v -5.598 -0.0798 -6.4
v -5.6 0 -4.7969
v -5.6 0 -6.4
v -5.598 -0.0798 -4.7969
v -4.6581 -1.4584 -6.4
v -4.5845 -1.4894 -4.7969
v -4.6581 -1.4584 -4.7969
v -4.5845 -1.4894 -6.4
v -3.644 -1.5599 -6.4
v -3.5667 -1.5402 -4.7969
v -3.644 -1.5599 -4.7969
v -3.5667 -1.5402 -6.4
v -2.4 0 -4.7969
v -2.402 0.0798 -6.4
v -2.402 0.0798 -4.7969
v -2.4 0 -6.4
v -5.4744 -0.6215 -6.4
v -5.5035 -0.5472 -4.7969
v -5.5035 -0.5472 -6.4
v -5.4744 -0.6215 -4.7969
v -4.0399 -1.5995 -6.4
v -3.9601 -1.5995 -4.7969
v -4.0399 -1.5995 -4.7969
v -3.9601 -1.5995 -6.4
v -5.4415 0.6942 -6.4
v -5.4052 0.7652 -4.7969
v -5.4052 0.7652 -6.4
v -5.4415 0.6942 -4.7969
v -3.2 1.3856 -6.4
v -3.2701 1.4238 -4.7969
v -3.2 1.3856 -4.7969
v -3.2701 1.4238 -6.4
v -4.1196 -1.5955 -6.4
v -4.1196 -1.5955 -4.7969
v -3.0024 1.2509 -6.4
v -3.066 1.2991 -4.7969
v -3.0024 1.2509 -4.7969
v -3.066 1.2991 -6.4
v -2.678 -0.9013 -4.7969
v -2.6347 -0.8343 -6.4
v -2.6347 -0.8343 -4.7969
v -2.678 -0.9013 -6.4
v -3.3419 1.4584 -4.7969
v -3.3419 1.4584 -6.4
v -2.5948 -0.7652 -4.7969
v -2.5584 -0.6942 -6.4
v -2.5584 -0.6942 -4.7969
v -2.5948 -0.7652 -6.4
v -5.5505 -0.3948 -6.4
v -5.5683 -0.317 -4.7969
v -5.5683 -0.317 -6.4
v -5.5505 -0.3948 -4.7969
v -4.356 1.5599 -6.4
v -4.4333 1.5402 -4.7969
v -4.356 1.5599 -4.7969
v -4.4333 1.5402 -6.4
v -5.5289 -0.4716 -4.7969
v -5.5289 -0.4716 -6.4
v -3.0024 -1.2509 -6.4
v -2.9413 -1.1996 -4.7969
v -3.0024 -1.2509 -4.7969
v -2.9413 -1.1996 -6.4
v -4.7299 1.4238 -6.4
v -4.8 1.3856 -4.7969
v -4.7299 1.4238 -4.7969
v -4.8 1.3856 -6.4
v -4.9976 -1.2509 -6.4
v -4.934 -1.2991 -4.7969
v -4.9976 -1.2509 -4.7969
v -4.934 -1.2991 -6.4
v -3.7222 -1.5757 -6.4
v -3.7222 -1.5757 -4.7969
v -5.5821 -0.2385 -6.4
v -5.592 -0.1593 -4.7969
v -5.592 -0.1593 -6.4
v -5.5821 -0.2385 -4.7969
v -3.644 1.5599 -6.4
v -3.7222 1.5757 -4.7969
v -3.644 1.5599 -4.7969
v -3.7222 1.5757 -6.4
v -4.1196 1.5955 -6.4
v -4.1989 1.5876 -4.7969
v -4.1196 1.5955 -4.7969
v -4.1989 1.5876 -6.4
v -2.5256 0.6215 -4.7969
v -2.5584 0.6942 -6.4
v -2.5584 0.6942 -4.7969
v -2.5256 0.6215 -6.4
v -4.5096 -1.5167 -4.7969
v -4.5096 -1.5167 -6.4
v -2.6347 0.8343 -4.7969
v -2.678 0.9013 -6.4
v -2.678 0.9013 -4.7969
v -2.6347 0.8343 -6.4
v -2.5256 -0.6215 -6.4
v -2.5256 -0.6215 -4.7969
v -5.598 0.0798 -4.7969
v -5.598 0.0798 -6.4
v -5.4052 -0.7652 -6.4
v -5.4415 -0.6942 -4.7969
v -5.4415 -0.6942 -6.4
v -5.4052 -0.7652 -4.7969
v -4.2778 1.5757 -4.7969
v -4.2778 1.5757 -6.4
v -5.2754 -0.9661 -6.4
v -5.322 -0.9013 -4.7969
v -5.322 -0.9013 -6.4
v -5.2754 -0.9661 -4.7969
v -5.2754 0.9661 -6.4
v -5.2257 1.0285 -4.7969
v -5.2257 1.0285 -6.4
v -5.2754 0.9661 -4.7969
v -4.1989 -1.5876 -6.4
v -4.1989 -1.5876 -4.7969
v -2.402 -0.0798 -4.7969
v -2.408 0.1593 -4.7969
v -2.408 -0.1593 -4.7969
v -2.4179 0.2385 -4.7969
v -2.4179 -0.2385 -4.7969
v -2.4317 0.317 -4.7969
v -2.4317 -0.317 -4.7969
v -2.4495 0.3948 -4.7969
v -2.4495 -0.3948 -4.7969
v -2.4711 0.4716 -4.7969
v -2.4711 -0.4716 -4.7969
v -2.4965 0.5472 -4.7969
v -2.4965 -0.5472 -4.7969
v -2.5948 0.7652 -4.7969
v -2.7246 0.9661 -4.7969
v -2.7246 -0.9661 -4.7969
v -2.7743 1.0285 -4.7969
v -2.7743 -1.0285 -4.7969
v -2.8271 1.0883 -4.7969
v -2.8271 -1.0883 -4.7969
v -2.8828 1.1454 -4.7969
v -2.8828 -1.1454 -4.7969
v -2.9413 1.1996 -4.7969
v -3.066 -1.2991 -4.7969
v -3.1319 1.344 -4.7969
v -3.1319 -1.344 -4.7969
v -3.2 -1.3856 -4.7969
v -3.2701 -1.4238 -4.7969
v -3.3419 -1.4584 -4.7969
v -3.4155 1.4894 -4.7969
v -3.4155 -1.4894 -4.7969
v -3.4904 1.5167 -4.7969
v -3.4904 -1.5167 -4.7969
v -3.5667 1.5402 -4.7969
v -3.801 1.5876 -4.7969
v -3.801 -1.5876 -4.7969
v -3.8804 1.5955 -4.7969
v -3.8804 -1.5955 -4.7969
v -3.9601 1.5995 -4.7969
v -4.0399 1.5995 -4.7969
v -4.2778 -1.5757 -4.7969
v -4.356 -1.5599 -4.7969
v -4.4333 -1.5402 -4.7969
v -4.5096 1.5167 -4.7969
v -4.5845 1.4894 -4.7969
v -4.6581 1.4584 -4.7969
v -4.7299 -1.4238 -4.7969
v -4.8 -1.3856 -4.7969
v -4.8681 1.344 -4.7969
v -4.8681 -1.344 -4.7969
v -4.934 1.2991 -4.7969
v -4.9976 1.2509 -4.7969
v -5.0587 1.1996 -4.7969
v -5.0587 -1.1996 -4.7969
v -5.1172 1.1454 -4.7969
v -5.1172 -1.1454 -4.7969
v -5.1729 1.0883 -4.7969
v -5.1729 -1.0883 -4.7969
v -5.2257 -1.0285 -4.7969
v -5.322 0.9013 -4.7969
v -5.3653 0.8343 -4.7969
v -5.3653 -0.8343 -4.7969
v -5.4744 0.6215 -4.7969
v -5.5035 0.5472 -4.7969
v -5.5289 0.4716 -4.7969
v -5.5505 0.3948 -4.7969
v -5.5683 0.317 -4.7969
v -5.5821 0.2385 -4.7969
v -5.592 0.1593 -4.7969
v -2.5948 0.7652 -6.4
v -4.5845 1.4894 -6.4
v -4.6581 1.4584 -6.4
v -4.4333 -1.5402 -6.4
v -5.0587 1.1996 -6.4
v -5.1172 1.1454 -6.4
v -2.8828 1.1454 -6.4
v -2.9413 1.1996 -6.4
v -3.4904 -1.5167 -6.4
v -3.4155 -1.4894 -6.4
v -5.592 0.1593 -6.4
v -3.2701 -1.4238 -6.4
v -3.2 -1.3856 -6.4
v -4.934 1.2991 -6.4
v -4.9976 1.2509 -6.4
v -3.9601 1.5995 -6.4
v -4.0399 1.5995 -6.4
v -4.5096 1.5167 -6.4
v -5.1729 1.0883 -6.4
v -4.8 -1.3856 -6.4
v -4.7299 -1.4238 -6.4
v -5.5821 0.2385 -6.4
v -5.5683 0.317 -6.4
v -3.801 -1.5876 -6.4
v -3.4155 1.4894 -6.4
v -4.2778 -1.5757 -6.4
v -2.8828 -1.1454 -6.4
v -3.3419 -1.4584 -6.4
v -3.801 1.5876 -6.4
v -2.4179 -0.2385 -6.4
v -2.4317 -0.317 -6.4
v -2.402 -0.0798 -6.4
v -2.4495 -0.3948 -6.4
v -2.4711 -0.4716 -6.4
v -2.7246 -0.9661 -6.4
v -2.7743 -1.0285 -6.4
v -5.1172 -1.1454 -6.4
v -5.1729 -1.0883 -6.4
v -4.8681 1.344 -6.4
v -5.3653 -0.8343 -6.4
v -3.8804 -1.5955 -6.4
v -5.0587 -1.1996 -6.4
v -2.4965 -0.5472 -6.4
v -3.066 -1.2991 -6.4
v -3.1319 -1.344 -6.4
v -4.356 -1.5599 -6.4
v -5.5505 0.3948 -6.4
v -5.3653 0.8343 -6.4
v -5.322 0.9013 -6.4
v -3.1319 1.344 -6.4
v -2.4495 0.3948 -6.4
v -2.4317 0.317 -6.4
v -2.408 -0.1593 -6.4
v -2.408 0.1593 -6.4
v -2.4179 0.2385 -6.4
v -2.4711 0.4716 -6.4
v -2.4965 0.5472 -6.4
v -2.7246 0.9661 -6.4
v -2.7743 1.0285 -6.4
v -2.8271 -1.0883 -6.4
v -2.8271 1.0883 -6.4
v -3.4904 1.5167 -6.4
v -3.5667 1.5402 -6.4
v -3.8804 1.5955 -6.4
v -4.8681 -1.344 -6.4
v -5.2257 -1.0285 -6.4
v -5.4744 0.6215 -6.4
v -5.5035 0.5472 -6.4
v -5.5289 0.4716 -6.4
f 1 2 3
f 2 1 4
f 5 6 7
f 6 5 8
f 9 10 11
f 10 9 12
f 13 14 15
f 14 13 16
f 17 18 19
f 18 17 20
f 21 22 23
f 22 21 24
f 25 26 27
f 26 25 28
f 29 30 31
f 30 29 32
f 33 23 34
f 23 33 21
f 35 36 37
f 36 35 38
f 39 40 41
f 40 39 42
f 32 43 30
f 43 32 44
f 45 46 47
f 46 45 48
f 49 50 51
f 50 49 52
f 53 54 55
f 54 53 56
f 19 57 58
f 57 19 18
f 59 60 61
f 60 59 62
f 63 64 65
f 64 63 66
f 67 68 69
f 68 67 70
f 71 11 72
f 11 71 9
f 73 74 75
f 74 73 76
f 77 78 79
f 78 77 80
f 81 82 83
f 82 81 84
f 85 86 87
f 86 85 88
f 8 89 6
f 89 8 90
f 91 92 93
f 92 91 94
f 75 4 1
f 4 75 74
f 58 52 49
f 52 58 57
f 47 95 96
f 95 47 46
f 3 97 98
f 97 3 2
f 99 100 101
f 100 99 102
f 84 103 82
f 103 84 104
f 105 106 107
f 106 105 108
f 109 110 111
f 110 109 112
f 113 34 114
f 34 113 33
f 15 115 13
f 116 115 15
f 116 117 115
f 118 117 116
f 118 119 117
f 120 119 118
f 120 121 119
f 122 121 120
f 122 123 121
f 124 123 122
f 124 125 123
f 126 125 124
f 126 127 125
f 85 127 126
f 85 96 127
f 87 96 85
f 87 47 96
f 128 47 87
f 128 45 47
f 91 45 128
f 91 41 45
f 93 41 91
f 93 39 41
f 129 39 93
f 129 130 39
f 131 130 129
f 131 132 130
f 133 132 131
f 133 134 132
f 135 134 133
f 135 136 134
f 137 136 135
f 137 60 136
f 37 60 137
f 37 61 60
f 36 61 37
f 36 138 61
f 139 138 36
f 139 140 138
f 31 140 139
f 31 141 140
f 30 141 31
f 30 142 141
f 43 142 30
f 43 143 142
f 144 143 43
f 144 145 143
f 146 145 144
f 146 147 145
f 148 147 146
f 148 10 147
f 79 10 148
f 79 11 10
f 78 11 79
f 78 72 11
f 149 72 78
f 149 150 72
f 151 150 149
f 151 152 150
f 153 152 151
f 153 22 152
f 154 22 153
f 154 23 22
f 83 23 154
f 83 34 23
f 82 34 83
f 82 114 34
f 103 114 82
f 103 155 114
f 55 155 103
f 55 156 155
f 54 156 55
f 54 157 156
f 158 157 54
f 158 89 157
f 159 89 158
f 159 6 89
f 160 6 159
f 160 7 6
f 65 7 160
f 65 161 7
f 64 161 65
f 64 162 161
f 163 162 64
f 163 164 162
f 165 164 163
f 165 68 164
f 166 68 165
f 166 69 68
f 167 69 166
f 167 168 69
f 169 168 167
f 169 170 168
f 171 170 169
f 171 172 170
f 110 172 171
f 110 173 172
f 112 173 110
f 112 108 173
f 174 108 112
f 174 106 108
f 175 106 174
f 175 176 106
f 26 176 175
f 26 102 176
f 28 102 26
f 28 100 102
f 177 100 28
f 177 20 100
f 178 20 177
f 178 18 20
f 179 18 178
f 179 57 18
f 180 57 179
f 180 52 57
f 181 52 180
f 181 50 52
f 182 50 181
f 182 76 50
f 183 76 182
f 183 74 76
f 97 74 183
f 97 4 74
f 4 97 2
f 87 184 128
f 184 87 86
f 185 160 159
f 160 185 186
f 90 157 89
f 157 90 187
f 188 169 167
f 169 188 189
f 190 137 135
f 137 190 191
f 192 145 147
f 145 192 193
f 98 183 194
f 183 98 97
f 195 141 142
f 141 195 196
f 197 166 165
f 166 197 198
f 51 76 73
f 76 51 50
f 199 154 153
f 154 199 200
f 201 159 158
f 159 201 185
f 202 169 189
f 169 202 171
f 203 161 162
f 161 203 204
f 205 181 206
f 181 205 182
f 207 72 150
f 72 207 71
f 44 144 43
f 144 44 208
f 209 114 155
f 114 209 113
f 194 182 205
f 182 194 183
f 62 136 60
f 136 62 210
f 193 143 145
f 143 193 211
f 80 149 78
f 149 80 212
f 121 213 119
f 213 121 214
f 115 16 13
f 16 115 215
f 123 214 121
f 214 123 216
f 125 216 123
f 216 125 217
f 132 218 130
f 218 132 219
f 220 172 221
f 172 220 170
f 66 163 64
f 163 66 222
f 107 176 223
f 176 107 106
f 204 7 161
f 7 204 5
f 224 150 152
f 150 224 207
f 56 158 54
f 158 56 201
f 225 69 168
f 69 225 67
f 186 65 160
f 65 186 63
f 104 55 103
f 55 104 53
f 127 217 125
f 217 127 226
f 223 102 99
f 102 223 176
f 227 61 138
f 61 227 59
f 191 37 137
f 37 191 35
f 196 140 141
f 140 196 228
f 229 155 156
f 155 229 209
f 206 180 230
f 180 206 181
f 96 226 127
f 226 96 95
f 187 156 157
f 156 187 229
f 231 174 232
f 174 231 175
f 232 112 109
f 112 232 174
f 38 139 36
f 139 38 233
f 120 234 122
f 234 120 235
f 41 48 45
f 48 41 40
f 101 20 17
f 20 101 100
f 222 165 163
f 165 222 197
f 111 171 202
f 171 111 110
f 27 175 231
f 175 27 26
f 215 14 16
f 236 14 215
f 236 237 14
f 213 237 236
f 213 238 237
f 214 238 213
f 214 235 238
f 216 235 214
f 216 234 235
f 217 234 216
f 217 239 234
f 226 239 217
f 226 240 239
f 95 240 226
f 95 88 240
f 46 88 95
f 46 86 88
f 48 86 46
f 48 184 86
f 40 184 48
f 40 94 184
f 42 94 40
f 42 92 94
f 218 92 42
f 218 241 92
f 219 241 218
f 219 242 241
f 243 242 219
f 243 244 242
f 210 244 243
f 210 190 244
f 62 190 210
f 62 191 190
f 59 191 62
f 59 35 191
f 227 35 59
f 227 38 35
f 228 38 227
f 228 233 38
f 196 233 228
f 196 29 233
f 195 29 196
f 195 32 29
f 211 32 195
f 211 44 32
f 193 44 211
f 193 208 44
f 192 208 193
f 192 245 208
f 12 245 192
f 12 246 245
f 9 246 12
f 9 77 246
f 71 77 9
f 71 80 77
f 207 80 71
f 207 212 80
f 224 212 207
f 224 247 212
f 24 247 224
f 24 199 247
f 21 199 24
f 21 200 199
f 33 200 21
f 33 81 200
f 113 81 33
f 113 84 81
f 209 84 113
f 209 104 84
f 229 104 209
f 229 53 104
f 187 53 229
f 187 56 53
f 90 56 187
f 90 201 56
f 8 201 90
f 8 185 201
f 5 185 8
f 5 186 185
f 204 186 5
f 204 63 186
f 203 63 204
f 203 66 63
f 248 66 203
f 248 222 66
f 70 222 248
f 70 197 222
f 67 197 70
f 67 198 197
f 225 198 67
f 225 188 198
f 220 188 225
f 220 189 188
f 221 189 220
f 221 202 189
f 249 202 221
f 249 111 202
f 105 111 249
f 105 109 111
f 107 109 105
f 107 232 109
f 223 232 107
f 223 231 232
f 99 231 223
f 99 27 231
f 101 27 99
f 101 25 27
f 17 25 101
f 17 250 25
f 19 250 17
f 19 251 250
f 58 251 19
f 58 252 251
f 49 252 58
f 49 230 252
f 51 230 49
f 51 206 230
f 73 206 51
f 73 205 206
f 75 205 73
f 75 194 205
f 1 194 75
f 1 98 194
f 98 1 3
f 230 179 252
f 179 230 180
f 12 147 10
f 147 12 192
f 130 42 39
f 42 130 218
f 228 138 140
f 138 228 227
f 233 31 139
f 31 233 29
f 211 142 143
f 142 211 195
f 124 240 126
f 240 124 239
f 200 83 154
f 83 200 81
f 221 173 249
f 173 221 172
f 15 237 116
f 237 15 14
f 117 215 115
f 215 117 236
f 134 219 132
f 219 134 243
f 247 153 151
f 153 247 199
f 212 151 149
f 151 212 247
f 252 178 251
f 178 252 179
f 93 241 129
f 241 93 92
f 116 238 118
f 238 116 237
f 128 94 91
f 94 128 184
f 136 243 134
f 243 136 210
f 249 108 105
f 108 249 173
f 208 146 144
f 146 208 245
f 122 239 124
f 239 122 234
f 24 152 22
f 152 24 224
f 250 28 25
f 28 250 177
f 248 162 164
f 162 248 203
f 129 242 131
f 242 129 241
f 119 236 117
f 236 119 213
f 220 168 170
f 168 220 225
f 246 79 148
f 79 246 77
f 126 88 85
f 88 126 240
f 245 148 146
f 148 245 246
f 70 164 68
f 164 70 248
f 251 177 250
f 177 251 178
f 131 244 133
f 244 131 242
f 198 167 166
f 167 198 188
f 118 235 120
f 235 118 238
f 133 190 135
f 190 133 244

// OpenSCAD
use <../lib.scad>
use <../p/1-4cyli.scad>
use <../p/1-4disc.scad>
use <../p/1-4edge.scad>
use <../p/box2-7.scad>
use <../p/box4-1.scad>
use <../p/box5-4a.scad>
use <../p/rect.scad>
use <../p/rect2p.scad>
use <../p/rect3.scad>
use <../p/stud3.scad>
$fa=1; $fs=0.2;
function ldraw_lib__58125a(realsolid=false) = [
// 0 ~Electric Power Functions Connector Bottom (PF Type)(Needs Work)
// 0 Name: 58125a.dat
// 0 Author: Philippe Hurbain [Philo]
// 0 !LDRAW_ORG Part UPDATE 2012-01
// 0 !LICENSE Licensed under CC BY 2.0 and CC BY 4.0 : see CAreadme.txt
// 
// 0 BFC CERTIFY CW
  [0,"BFC","CERTIFY"],
  [0,"BFC","CW"],
// 
// 0 !HISTORY 2012-03-30 [PTadmin] Official Update 2012-01
// 
// 
// 0 // Needs Work: inner side not modelled
// 
// 1 494 6 14 -2 0 -1.5 0 0 0 2 -2 0 0 box4-1.dat
  [1,494,6,14,-2,0,-1.5,0,0,0,2,-2,0,0, ldraw_lib__box4_1(realsolid)],
// 1 494 6 14 6 0 -1.5 0 0 0 2 -2 0 0 box4-1.dat
  [1,494,6,14,6,0,-1.5,0,0,0,2,-2,0,0, ldraw_lib__box4_1(realsolid)],
// 1 494 11 14 2 0 1.5 0 0 0 2 2 0 0 box4-1.dat
  [1,494,11,14,2,0,1.5,0,0,0,2,2,0,0, ldraw_lib__box4_1(realsolid)],
// 1 494 11 14 -6 0 1.5 0 0 0 2 2 0 0 box4-1.dat
  [1,494,11,14,-6,0,1.5,0,0,0,2,2,0,0, ldraw_lib__box4_1(realsolid)],
// 1 16 -10 12 0 0 0 1 0 -1 0 -1 0 0 stud3.dat
  [1,16,-10,12,0,0,0,1,0,-1,0,-1,0,0, ldraw_lib__stud3(realsolid)],
// 1 16 -2 12 0 0 0 -2 0 4 0 -16 0 0 box5-4a.dat
  [1,16,-2,12,0,0,0,-2,0,4,0,-16,0,0, ldraw_lib__box5_4a(realsolid)],
// 2 24 0 12 16 0 12 -16
  [2,24,0,12,16,0,12,-16],
// 2 24 -4 12 16 -4 12 -16
  [2,24,-4,12,16,-4,12,-16],
// 4 16 16 12 7 -16 12 16 -16 12 -16 16 12 -7
  [4,16,16,12,7,-16,12,16,-16,12,-16,16,12,-7],
// 3 16 -16 12 -16 16 12 -16 16 12 -7
  [3,16,-16,12,-16,16,12,-16,16,12,-7],
// 3 16 -16 12 16 16 12 7 16 12 16
  [3,16,-16,12,16,16,12,7,16,12,16],
// 4 16 11 16 0 6 16 4 6 16 0 11 16 -4
  [4,16,11,16,0,6,16,4,6,16,0,11,16,-4],
// 4 16 11 16 -4 6 16 0 6 16 -4 11 16 -8
  [4,16,11,16,-4,6,16,0,6,16,-4,11,16,-8],
// 4 16 11 16 -8 6 16 -4 7 16 -10 10 16 -10
  [4,16,11,16,-8,6,16,-4,7,16,-10,10,16,-10],
// 4 16 6 16 -4 5 16 -4 5 16 -10 7 16 -10
  [4,16,6,16,-4,5,16,-4,5,16,-10,7,16,-10],
// 4 16 11 16 4 6 16 8 6 16 4 11 16 0
  [4,16,11,16,4,6,16,8,6,16,4,11,16,0],
// 4 16 10 16 10 7 16 10 6 16 8 11 16 4
  [4,16,10,16,10,7,16,10,6,16,8,11,16,4],
// 4 16 10 16 12 7 16 12 7 16 10 10 16 10
  [4,16,10,16,12,7,16,12,7,16,10,10,16,10],
// 4 16 10 16 -10 7 16 -10 7 16 -12 10 16 -12
  [4,16,10,16,-10,7,16,-10,7,16,-12,10,16,-12],
// 4 16 6 16 4 5 16 4 5 16 0 6 16 0
  [4,16,6,16,4,5,16,4,5,16,0,6,16,0],
// 4 16 12 16 0 11 16 0 11 16 -4 12 16 -4
  [4,16,12,16,0,11,16,0,11,16,-4,12,16,-4],
// 4 16 12 16 -8 11 16 -8 10 16 -10 12 16 -10
  [4,16,12,16,-8,11,16,-8,10,16,-10,12,16,-10],
// 4 16 7 16 10 5 16 10 5 16 8 6 16 8
  [4,16,7,16,10,5,16,10,5,16,8,6,16,8],
// 4 16 12 16 10 10 16 10 11 16 4 12 16 4
  [4,16,12,16,10,10,16,10,11,16,4,12,16,4],
// 1 16 23 10.5 0 0 7 0 0 0 1.5 -6 0 0 box2-7.dat
  [1,16,23,10.5,0,0,7,0,0,0,1.5,-6,0,0, ldraw_lib__box2_7(realsolid)],
// 0 BFC INVERTNEXT
  [0,"BFC","INVERTNEXT"],
// 1 16 28 7 0 0 -2 0 0 0 2 6 0 0 box2-7.dat
  [1,16,28,7,0,0,-2,0,0,0,2,6,0,0, ldraw_lib__box2_7(realsolid)],
// 4 16 26 5 -6 26 12 -6 16 12 -6 16 5 -6
  [4,16,26,5,-6,26,12,-6,16,12,-6,16,5,-6],
// 4 16 16 5 -16 16 12 -16 -16 12 -16 -16 5 -16
  [4,16,16,5,-16,16,12,-16,-16,12,-16,-16,5,-16],
// 4 16 -16 5 16 -16 12 16 16 12 16 16 5 16
  [4,16,-16,5,16,-16,12,16,16,12,16,16,5,16],
// 2 24 16 12 -16 0 12 -16
  [2,24,16,12,-16,0,12,-16],
// 2 24 16 12 16 0 12 16
  [2,24,16,12,16,0,12,16],
// 2 24 -4 12 16 -16 12 16
  [2,24,-4,12,16,-16,12,16],
// 2 24 -4 12 -16 -16 12 -16
  [2,24,-4,12,-16,-16,12,-16],
// 2 24 16 12 -6 16 12 -16
  [2,24,16,12,-6,16,12,-16],
// 2 24 16 12 16 16 12 6
  [2,24,16,12,16,16,12,6],
// 2 24 -16 12 16 -16 12 -16
  [2,24,-16,12,16,-16,12,-16],
// 2 24 -15 9 -16 -7 9 -16
  [2,24,-15,9,-16,-7,9,-16],
// 2 24 -15 9 16 -7 9 16
  [2,24,-15,9,16,-7,9,16],
// 2 24 7 9 -16 15 9 -16
  [2,24,7,9,-16,15,9,-16],
// 2 24 7 9 16 15 9 16
  [2,24,7,9,16,15,9,16],
// 2 24 20 9 -6 26 9 -6
  [2,24,20,9,-6,26,9,-6],
// 2 24 20 9 6 26 9 6
  [2,24,20,9,6,26,9,6],
// 2 24 30 9 6 30 9 -6
  [2,24,30,9,6,30,9,-6],
// 2 24 26 5 6 26 5 -6
  [2,24,26,5,6,26,5,-6],
// 4 16 16 5 6 16 12 6 26 12 6 26 5 6
  [4,16,16,5,6,16,12,6,26,12,6,26,5,6],
// 1 16 10 12 -10 0 0 2 0 4 0 -2 0 0 1-4cyli.dat
  [1,16,10,12,-10,0,0,2,0,4,0,-2,0,0, ldraw_lib__1_4cyli(realsolid)],
// 1 16 10 12 -10 0 0 2 0 4 0 -2 0 0 1-4edge.dat
  [1,16,10,12,-10,0,0,2,0,4,0,-2,0,0, ldraw_lib__1_4edge(realsolid)],
// 1 16 10 16 -10 0 0 2 0 4 0 -2 0 0 1-4edge.dat
  [1,16,10,16,-10,0,0,2,0,4,0,-2,0,0, ldraw_lib__1_4edge(realsolid)],
// 1 16 7 12 -10 -2 0 0 0 4 0 0 0 -2 1-4cyli.dat
  [1,16,7,12,-10,-2,0,0,0,4,0,0,0,-2, ldraw_lib__1_4cyli(realsolid)],
// 1 16 7 12 -10 -2 0 0 0 4 0 0 0 -2 1-4edge.dat
  [1,16,7,12,-10,-2,0,0,0,4,0,0,0,-2, ldraw_lib__1_4edge(realsolid)],
// 1 16 7 16 -10 -2 0 0 0 4 0 0 0 -2 1-4edge.dat
  [1,16,7,16,-10,-2,0,0,0,4,0,0,0,-2, ldraw_lib__1_4edge(realsolid)],
// 1 16 7 12 10 0 0 -2 0 4 0 2 0 0 1-4cyli.dat
  [1,16,7,12,10,0,0,-2,0,4,0,2,0,0, ldraw_lib__1_4cyli(realsolid)],
// 1 16 7 12 10 0 0 -2 0 4 0 2 0 0 1-4edge.dat
  [1,16,7,12,10,0,0,-2,0,4,0,2,0,0, ldraw_lib__1_4edge(realsolid)],
// 1 16 7 16 10 0 0 -2 0 4 0 2 0 0 1-4edge.dat
  [1,16,7,16,10,0,0,-2,0,4,0,2,0,0, ldraw_lib__1_4edge(realsolid)],
// 1 16 10 12 10 2 0 0 0 4 0 0 0 2 1-4cyli.dat
  [1,16,10,12,10,2,0,0,0,4,0,0,0,2, ldraw_lib__1_4cyli(realsolid)],
// 1 16 10 12 10 2 0 0 0 4 0 0 0 2 1-4edge.dat
  [1,16,10,12,10,2,0,0,0,4,0,0,0,2, ldraw_lib__1_4edge(realsolid)],
// 1 16 10 16 10 2 0 0 0 4 0 0 0 2 1-4edge.dat
  [1,16,10,16,10,2,0,0,0,4,0,0,0,2, ldraw_lib__1_4edge(realsolid)],
// 1 16 10 16 10 2 0 0 0 -1 0 0 0 2 1-4disc.dat
  [1,16,10,16,10,2,0,0,0,-1,0,0,0,2, ldraw_lib__1_4disc(realsolid)],
// 1 16 7 16 10 0 0 -2 0 -1 0 2 0 0 1-4disc.dat
  [1,16,7,16,10,0,0,-2,0,-1,0,2,0,0, ldraw_lib__1_4disc(realsolid)],
// 1 16 7 16 -10 -2 0 0 0 -1 0 0 0 -2 1-4disc.dat
  [1,16,7,16,-10,-2,0,0,0,-1,0,0,0,-2, ldraw_lib__1_4disc(realsolid)],
// 1 16 10 16 -10 0 0 2 0 -1 0 -2 0 0 1-4disc.dat
  [1,16,10,16,-10,0,0,2,0,-1,0,-2,0,0, ldraw_lib__1_4disc(realsolid)],
// 1 16 8.5 14 -12 -1.5 0 0 0 0 -2 0 1 0 rect2p.dat
  [1,16,8.5,14,-12,-1.5,0,0,0,0,-2,0,1,0, ldraw_lib__rect2p(realsolid)],
// 1 16 8.5 14 12 1.5 0 0 0 0 -2 0 -1 0 rect2p.dat
  [1,16,8.5,14,12,1.5,0,0,0,0,-2,0,-1,0, ldraw_lib__rect2p(realsolid)],
// 1 16 5 14 2 0 1 0 0 0 -2 -2 0 0 rect.dat
  [1,16,5,14,2,0,1,0,0,0,-2,-2,0,0, ldraw_lib__rect(realsolid)],
// 1 16 12 14 -2 0 -1 0 0 0 -2 2 0 0 rect.dat
  [1,16,12,14,-2,0,-1,0,0,0,-2,2,0,0, ldraw_lib__rect(realsolid)],
// 1 16 5 14 -7 0 1 0 -2 0 0 0 0 3 rect3.dat
  [1,16,5,14,-7,0,1,0,-2,0,0,0,0,3, ldraw_lib__rect3(realsolid)],
// 1 16 12 14 -9 0 -1 0 -2 0 0 0 0 1 rect3.dat
  [1,16,12,14,-9,0,-1,0,-2,0,0,0,0,1, ldraw_lib__rect3(realsolid)],
// 1 16 12 14 7 0 -1 0 -2 0 0 0 0 -3 rect3.dat
  [1,16,12,14,7,0,-1,0,-2,0,0,0,0,-3, ldraw_lib__rect3(realsolid)],
// 1 16 5 14 9 0 1 0 -2 0 0 0 0 -1 rect3.dat
  [1,16,5,14,9,0,1,0,-2,0,0,0,0,-1, ldraw_lib__rect3(realsolid)],
];
module ldraw_lib__58125a(step=0, col=false, unit=2/5, alt=false, line=0.2, solid=!$preview)
    makepoly(ldraw_lib__58125a(solid), step=step, col=col, unit=unit, alt=alt, line=line, solid=solid);
ldraw_lib__58125a(line=0.2);
